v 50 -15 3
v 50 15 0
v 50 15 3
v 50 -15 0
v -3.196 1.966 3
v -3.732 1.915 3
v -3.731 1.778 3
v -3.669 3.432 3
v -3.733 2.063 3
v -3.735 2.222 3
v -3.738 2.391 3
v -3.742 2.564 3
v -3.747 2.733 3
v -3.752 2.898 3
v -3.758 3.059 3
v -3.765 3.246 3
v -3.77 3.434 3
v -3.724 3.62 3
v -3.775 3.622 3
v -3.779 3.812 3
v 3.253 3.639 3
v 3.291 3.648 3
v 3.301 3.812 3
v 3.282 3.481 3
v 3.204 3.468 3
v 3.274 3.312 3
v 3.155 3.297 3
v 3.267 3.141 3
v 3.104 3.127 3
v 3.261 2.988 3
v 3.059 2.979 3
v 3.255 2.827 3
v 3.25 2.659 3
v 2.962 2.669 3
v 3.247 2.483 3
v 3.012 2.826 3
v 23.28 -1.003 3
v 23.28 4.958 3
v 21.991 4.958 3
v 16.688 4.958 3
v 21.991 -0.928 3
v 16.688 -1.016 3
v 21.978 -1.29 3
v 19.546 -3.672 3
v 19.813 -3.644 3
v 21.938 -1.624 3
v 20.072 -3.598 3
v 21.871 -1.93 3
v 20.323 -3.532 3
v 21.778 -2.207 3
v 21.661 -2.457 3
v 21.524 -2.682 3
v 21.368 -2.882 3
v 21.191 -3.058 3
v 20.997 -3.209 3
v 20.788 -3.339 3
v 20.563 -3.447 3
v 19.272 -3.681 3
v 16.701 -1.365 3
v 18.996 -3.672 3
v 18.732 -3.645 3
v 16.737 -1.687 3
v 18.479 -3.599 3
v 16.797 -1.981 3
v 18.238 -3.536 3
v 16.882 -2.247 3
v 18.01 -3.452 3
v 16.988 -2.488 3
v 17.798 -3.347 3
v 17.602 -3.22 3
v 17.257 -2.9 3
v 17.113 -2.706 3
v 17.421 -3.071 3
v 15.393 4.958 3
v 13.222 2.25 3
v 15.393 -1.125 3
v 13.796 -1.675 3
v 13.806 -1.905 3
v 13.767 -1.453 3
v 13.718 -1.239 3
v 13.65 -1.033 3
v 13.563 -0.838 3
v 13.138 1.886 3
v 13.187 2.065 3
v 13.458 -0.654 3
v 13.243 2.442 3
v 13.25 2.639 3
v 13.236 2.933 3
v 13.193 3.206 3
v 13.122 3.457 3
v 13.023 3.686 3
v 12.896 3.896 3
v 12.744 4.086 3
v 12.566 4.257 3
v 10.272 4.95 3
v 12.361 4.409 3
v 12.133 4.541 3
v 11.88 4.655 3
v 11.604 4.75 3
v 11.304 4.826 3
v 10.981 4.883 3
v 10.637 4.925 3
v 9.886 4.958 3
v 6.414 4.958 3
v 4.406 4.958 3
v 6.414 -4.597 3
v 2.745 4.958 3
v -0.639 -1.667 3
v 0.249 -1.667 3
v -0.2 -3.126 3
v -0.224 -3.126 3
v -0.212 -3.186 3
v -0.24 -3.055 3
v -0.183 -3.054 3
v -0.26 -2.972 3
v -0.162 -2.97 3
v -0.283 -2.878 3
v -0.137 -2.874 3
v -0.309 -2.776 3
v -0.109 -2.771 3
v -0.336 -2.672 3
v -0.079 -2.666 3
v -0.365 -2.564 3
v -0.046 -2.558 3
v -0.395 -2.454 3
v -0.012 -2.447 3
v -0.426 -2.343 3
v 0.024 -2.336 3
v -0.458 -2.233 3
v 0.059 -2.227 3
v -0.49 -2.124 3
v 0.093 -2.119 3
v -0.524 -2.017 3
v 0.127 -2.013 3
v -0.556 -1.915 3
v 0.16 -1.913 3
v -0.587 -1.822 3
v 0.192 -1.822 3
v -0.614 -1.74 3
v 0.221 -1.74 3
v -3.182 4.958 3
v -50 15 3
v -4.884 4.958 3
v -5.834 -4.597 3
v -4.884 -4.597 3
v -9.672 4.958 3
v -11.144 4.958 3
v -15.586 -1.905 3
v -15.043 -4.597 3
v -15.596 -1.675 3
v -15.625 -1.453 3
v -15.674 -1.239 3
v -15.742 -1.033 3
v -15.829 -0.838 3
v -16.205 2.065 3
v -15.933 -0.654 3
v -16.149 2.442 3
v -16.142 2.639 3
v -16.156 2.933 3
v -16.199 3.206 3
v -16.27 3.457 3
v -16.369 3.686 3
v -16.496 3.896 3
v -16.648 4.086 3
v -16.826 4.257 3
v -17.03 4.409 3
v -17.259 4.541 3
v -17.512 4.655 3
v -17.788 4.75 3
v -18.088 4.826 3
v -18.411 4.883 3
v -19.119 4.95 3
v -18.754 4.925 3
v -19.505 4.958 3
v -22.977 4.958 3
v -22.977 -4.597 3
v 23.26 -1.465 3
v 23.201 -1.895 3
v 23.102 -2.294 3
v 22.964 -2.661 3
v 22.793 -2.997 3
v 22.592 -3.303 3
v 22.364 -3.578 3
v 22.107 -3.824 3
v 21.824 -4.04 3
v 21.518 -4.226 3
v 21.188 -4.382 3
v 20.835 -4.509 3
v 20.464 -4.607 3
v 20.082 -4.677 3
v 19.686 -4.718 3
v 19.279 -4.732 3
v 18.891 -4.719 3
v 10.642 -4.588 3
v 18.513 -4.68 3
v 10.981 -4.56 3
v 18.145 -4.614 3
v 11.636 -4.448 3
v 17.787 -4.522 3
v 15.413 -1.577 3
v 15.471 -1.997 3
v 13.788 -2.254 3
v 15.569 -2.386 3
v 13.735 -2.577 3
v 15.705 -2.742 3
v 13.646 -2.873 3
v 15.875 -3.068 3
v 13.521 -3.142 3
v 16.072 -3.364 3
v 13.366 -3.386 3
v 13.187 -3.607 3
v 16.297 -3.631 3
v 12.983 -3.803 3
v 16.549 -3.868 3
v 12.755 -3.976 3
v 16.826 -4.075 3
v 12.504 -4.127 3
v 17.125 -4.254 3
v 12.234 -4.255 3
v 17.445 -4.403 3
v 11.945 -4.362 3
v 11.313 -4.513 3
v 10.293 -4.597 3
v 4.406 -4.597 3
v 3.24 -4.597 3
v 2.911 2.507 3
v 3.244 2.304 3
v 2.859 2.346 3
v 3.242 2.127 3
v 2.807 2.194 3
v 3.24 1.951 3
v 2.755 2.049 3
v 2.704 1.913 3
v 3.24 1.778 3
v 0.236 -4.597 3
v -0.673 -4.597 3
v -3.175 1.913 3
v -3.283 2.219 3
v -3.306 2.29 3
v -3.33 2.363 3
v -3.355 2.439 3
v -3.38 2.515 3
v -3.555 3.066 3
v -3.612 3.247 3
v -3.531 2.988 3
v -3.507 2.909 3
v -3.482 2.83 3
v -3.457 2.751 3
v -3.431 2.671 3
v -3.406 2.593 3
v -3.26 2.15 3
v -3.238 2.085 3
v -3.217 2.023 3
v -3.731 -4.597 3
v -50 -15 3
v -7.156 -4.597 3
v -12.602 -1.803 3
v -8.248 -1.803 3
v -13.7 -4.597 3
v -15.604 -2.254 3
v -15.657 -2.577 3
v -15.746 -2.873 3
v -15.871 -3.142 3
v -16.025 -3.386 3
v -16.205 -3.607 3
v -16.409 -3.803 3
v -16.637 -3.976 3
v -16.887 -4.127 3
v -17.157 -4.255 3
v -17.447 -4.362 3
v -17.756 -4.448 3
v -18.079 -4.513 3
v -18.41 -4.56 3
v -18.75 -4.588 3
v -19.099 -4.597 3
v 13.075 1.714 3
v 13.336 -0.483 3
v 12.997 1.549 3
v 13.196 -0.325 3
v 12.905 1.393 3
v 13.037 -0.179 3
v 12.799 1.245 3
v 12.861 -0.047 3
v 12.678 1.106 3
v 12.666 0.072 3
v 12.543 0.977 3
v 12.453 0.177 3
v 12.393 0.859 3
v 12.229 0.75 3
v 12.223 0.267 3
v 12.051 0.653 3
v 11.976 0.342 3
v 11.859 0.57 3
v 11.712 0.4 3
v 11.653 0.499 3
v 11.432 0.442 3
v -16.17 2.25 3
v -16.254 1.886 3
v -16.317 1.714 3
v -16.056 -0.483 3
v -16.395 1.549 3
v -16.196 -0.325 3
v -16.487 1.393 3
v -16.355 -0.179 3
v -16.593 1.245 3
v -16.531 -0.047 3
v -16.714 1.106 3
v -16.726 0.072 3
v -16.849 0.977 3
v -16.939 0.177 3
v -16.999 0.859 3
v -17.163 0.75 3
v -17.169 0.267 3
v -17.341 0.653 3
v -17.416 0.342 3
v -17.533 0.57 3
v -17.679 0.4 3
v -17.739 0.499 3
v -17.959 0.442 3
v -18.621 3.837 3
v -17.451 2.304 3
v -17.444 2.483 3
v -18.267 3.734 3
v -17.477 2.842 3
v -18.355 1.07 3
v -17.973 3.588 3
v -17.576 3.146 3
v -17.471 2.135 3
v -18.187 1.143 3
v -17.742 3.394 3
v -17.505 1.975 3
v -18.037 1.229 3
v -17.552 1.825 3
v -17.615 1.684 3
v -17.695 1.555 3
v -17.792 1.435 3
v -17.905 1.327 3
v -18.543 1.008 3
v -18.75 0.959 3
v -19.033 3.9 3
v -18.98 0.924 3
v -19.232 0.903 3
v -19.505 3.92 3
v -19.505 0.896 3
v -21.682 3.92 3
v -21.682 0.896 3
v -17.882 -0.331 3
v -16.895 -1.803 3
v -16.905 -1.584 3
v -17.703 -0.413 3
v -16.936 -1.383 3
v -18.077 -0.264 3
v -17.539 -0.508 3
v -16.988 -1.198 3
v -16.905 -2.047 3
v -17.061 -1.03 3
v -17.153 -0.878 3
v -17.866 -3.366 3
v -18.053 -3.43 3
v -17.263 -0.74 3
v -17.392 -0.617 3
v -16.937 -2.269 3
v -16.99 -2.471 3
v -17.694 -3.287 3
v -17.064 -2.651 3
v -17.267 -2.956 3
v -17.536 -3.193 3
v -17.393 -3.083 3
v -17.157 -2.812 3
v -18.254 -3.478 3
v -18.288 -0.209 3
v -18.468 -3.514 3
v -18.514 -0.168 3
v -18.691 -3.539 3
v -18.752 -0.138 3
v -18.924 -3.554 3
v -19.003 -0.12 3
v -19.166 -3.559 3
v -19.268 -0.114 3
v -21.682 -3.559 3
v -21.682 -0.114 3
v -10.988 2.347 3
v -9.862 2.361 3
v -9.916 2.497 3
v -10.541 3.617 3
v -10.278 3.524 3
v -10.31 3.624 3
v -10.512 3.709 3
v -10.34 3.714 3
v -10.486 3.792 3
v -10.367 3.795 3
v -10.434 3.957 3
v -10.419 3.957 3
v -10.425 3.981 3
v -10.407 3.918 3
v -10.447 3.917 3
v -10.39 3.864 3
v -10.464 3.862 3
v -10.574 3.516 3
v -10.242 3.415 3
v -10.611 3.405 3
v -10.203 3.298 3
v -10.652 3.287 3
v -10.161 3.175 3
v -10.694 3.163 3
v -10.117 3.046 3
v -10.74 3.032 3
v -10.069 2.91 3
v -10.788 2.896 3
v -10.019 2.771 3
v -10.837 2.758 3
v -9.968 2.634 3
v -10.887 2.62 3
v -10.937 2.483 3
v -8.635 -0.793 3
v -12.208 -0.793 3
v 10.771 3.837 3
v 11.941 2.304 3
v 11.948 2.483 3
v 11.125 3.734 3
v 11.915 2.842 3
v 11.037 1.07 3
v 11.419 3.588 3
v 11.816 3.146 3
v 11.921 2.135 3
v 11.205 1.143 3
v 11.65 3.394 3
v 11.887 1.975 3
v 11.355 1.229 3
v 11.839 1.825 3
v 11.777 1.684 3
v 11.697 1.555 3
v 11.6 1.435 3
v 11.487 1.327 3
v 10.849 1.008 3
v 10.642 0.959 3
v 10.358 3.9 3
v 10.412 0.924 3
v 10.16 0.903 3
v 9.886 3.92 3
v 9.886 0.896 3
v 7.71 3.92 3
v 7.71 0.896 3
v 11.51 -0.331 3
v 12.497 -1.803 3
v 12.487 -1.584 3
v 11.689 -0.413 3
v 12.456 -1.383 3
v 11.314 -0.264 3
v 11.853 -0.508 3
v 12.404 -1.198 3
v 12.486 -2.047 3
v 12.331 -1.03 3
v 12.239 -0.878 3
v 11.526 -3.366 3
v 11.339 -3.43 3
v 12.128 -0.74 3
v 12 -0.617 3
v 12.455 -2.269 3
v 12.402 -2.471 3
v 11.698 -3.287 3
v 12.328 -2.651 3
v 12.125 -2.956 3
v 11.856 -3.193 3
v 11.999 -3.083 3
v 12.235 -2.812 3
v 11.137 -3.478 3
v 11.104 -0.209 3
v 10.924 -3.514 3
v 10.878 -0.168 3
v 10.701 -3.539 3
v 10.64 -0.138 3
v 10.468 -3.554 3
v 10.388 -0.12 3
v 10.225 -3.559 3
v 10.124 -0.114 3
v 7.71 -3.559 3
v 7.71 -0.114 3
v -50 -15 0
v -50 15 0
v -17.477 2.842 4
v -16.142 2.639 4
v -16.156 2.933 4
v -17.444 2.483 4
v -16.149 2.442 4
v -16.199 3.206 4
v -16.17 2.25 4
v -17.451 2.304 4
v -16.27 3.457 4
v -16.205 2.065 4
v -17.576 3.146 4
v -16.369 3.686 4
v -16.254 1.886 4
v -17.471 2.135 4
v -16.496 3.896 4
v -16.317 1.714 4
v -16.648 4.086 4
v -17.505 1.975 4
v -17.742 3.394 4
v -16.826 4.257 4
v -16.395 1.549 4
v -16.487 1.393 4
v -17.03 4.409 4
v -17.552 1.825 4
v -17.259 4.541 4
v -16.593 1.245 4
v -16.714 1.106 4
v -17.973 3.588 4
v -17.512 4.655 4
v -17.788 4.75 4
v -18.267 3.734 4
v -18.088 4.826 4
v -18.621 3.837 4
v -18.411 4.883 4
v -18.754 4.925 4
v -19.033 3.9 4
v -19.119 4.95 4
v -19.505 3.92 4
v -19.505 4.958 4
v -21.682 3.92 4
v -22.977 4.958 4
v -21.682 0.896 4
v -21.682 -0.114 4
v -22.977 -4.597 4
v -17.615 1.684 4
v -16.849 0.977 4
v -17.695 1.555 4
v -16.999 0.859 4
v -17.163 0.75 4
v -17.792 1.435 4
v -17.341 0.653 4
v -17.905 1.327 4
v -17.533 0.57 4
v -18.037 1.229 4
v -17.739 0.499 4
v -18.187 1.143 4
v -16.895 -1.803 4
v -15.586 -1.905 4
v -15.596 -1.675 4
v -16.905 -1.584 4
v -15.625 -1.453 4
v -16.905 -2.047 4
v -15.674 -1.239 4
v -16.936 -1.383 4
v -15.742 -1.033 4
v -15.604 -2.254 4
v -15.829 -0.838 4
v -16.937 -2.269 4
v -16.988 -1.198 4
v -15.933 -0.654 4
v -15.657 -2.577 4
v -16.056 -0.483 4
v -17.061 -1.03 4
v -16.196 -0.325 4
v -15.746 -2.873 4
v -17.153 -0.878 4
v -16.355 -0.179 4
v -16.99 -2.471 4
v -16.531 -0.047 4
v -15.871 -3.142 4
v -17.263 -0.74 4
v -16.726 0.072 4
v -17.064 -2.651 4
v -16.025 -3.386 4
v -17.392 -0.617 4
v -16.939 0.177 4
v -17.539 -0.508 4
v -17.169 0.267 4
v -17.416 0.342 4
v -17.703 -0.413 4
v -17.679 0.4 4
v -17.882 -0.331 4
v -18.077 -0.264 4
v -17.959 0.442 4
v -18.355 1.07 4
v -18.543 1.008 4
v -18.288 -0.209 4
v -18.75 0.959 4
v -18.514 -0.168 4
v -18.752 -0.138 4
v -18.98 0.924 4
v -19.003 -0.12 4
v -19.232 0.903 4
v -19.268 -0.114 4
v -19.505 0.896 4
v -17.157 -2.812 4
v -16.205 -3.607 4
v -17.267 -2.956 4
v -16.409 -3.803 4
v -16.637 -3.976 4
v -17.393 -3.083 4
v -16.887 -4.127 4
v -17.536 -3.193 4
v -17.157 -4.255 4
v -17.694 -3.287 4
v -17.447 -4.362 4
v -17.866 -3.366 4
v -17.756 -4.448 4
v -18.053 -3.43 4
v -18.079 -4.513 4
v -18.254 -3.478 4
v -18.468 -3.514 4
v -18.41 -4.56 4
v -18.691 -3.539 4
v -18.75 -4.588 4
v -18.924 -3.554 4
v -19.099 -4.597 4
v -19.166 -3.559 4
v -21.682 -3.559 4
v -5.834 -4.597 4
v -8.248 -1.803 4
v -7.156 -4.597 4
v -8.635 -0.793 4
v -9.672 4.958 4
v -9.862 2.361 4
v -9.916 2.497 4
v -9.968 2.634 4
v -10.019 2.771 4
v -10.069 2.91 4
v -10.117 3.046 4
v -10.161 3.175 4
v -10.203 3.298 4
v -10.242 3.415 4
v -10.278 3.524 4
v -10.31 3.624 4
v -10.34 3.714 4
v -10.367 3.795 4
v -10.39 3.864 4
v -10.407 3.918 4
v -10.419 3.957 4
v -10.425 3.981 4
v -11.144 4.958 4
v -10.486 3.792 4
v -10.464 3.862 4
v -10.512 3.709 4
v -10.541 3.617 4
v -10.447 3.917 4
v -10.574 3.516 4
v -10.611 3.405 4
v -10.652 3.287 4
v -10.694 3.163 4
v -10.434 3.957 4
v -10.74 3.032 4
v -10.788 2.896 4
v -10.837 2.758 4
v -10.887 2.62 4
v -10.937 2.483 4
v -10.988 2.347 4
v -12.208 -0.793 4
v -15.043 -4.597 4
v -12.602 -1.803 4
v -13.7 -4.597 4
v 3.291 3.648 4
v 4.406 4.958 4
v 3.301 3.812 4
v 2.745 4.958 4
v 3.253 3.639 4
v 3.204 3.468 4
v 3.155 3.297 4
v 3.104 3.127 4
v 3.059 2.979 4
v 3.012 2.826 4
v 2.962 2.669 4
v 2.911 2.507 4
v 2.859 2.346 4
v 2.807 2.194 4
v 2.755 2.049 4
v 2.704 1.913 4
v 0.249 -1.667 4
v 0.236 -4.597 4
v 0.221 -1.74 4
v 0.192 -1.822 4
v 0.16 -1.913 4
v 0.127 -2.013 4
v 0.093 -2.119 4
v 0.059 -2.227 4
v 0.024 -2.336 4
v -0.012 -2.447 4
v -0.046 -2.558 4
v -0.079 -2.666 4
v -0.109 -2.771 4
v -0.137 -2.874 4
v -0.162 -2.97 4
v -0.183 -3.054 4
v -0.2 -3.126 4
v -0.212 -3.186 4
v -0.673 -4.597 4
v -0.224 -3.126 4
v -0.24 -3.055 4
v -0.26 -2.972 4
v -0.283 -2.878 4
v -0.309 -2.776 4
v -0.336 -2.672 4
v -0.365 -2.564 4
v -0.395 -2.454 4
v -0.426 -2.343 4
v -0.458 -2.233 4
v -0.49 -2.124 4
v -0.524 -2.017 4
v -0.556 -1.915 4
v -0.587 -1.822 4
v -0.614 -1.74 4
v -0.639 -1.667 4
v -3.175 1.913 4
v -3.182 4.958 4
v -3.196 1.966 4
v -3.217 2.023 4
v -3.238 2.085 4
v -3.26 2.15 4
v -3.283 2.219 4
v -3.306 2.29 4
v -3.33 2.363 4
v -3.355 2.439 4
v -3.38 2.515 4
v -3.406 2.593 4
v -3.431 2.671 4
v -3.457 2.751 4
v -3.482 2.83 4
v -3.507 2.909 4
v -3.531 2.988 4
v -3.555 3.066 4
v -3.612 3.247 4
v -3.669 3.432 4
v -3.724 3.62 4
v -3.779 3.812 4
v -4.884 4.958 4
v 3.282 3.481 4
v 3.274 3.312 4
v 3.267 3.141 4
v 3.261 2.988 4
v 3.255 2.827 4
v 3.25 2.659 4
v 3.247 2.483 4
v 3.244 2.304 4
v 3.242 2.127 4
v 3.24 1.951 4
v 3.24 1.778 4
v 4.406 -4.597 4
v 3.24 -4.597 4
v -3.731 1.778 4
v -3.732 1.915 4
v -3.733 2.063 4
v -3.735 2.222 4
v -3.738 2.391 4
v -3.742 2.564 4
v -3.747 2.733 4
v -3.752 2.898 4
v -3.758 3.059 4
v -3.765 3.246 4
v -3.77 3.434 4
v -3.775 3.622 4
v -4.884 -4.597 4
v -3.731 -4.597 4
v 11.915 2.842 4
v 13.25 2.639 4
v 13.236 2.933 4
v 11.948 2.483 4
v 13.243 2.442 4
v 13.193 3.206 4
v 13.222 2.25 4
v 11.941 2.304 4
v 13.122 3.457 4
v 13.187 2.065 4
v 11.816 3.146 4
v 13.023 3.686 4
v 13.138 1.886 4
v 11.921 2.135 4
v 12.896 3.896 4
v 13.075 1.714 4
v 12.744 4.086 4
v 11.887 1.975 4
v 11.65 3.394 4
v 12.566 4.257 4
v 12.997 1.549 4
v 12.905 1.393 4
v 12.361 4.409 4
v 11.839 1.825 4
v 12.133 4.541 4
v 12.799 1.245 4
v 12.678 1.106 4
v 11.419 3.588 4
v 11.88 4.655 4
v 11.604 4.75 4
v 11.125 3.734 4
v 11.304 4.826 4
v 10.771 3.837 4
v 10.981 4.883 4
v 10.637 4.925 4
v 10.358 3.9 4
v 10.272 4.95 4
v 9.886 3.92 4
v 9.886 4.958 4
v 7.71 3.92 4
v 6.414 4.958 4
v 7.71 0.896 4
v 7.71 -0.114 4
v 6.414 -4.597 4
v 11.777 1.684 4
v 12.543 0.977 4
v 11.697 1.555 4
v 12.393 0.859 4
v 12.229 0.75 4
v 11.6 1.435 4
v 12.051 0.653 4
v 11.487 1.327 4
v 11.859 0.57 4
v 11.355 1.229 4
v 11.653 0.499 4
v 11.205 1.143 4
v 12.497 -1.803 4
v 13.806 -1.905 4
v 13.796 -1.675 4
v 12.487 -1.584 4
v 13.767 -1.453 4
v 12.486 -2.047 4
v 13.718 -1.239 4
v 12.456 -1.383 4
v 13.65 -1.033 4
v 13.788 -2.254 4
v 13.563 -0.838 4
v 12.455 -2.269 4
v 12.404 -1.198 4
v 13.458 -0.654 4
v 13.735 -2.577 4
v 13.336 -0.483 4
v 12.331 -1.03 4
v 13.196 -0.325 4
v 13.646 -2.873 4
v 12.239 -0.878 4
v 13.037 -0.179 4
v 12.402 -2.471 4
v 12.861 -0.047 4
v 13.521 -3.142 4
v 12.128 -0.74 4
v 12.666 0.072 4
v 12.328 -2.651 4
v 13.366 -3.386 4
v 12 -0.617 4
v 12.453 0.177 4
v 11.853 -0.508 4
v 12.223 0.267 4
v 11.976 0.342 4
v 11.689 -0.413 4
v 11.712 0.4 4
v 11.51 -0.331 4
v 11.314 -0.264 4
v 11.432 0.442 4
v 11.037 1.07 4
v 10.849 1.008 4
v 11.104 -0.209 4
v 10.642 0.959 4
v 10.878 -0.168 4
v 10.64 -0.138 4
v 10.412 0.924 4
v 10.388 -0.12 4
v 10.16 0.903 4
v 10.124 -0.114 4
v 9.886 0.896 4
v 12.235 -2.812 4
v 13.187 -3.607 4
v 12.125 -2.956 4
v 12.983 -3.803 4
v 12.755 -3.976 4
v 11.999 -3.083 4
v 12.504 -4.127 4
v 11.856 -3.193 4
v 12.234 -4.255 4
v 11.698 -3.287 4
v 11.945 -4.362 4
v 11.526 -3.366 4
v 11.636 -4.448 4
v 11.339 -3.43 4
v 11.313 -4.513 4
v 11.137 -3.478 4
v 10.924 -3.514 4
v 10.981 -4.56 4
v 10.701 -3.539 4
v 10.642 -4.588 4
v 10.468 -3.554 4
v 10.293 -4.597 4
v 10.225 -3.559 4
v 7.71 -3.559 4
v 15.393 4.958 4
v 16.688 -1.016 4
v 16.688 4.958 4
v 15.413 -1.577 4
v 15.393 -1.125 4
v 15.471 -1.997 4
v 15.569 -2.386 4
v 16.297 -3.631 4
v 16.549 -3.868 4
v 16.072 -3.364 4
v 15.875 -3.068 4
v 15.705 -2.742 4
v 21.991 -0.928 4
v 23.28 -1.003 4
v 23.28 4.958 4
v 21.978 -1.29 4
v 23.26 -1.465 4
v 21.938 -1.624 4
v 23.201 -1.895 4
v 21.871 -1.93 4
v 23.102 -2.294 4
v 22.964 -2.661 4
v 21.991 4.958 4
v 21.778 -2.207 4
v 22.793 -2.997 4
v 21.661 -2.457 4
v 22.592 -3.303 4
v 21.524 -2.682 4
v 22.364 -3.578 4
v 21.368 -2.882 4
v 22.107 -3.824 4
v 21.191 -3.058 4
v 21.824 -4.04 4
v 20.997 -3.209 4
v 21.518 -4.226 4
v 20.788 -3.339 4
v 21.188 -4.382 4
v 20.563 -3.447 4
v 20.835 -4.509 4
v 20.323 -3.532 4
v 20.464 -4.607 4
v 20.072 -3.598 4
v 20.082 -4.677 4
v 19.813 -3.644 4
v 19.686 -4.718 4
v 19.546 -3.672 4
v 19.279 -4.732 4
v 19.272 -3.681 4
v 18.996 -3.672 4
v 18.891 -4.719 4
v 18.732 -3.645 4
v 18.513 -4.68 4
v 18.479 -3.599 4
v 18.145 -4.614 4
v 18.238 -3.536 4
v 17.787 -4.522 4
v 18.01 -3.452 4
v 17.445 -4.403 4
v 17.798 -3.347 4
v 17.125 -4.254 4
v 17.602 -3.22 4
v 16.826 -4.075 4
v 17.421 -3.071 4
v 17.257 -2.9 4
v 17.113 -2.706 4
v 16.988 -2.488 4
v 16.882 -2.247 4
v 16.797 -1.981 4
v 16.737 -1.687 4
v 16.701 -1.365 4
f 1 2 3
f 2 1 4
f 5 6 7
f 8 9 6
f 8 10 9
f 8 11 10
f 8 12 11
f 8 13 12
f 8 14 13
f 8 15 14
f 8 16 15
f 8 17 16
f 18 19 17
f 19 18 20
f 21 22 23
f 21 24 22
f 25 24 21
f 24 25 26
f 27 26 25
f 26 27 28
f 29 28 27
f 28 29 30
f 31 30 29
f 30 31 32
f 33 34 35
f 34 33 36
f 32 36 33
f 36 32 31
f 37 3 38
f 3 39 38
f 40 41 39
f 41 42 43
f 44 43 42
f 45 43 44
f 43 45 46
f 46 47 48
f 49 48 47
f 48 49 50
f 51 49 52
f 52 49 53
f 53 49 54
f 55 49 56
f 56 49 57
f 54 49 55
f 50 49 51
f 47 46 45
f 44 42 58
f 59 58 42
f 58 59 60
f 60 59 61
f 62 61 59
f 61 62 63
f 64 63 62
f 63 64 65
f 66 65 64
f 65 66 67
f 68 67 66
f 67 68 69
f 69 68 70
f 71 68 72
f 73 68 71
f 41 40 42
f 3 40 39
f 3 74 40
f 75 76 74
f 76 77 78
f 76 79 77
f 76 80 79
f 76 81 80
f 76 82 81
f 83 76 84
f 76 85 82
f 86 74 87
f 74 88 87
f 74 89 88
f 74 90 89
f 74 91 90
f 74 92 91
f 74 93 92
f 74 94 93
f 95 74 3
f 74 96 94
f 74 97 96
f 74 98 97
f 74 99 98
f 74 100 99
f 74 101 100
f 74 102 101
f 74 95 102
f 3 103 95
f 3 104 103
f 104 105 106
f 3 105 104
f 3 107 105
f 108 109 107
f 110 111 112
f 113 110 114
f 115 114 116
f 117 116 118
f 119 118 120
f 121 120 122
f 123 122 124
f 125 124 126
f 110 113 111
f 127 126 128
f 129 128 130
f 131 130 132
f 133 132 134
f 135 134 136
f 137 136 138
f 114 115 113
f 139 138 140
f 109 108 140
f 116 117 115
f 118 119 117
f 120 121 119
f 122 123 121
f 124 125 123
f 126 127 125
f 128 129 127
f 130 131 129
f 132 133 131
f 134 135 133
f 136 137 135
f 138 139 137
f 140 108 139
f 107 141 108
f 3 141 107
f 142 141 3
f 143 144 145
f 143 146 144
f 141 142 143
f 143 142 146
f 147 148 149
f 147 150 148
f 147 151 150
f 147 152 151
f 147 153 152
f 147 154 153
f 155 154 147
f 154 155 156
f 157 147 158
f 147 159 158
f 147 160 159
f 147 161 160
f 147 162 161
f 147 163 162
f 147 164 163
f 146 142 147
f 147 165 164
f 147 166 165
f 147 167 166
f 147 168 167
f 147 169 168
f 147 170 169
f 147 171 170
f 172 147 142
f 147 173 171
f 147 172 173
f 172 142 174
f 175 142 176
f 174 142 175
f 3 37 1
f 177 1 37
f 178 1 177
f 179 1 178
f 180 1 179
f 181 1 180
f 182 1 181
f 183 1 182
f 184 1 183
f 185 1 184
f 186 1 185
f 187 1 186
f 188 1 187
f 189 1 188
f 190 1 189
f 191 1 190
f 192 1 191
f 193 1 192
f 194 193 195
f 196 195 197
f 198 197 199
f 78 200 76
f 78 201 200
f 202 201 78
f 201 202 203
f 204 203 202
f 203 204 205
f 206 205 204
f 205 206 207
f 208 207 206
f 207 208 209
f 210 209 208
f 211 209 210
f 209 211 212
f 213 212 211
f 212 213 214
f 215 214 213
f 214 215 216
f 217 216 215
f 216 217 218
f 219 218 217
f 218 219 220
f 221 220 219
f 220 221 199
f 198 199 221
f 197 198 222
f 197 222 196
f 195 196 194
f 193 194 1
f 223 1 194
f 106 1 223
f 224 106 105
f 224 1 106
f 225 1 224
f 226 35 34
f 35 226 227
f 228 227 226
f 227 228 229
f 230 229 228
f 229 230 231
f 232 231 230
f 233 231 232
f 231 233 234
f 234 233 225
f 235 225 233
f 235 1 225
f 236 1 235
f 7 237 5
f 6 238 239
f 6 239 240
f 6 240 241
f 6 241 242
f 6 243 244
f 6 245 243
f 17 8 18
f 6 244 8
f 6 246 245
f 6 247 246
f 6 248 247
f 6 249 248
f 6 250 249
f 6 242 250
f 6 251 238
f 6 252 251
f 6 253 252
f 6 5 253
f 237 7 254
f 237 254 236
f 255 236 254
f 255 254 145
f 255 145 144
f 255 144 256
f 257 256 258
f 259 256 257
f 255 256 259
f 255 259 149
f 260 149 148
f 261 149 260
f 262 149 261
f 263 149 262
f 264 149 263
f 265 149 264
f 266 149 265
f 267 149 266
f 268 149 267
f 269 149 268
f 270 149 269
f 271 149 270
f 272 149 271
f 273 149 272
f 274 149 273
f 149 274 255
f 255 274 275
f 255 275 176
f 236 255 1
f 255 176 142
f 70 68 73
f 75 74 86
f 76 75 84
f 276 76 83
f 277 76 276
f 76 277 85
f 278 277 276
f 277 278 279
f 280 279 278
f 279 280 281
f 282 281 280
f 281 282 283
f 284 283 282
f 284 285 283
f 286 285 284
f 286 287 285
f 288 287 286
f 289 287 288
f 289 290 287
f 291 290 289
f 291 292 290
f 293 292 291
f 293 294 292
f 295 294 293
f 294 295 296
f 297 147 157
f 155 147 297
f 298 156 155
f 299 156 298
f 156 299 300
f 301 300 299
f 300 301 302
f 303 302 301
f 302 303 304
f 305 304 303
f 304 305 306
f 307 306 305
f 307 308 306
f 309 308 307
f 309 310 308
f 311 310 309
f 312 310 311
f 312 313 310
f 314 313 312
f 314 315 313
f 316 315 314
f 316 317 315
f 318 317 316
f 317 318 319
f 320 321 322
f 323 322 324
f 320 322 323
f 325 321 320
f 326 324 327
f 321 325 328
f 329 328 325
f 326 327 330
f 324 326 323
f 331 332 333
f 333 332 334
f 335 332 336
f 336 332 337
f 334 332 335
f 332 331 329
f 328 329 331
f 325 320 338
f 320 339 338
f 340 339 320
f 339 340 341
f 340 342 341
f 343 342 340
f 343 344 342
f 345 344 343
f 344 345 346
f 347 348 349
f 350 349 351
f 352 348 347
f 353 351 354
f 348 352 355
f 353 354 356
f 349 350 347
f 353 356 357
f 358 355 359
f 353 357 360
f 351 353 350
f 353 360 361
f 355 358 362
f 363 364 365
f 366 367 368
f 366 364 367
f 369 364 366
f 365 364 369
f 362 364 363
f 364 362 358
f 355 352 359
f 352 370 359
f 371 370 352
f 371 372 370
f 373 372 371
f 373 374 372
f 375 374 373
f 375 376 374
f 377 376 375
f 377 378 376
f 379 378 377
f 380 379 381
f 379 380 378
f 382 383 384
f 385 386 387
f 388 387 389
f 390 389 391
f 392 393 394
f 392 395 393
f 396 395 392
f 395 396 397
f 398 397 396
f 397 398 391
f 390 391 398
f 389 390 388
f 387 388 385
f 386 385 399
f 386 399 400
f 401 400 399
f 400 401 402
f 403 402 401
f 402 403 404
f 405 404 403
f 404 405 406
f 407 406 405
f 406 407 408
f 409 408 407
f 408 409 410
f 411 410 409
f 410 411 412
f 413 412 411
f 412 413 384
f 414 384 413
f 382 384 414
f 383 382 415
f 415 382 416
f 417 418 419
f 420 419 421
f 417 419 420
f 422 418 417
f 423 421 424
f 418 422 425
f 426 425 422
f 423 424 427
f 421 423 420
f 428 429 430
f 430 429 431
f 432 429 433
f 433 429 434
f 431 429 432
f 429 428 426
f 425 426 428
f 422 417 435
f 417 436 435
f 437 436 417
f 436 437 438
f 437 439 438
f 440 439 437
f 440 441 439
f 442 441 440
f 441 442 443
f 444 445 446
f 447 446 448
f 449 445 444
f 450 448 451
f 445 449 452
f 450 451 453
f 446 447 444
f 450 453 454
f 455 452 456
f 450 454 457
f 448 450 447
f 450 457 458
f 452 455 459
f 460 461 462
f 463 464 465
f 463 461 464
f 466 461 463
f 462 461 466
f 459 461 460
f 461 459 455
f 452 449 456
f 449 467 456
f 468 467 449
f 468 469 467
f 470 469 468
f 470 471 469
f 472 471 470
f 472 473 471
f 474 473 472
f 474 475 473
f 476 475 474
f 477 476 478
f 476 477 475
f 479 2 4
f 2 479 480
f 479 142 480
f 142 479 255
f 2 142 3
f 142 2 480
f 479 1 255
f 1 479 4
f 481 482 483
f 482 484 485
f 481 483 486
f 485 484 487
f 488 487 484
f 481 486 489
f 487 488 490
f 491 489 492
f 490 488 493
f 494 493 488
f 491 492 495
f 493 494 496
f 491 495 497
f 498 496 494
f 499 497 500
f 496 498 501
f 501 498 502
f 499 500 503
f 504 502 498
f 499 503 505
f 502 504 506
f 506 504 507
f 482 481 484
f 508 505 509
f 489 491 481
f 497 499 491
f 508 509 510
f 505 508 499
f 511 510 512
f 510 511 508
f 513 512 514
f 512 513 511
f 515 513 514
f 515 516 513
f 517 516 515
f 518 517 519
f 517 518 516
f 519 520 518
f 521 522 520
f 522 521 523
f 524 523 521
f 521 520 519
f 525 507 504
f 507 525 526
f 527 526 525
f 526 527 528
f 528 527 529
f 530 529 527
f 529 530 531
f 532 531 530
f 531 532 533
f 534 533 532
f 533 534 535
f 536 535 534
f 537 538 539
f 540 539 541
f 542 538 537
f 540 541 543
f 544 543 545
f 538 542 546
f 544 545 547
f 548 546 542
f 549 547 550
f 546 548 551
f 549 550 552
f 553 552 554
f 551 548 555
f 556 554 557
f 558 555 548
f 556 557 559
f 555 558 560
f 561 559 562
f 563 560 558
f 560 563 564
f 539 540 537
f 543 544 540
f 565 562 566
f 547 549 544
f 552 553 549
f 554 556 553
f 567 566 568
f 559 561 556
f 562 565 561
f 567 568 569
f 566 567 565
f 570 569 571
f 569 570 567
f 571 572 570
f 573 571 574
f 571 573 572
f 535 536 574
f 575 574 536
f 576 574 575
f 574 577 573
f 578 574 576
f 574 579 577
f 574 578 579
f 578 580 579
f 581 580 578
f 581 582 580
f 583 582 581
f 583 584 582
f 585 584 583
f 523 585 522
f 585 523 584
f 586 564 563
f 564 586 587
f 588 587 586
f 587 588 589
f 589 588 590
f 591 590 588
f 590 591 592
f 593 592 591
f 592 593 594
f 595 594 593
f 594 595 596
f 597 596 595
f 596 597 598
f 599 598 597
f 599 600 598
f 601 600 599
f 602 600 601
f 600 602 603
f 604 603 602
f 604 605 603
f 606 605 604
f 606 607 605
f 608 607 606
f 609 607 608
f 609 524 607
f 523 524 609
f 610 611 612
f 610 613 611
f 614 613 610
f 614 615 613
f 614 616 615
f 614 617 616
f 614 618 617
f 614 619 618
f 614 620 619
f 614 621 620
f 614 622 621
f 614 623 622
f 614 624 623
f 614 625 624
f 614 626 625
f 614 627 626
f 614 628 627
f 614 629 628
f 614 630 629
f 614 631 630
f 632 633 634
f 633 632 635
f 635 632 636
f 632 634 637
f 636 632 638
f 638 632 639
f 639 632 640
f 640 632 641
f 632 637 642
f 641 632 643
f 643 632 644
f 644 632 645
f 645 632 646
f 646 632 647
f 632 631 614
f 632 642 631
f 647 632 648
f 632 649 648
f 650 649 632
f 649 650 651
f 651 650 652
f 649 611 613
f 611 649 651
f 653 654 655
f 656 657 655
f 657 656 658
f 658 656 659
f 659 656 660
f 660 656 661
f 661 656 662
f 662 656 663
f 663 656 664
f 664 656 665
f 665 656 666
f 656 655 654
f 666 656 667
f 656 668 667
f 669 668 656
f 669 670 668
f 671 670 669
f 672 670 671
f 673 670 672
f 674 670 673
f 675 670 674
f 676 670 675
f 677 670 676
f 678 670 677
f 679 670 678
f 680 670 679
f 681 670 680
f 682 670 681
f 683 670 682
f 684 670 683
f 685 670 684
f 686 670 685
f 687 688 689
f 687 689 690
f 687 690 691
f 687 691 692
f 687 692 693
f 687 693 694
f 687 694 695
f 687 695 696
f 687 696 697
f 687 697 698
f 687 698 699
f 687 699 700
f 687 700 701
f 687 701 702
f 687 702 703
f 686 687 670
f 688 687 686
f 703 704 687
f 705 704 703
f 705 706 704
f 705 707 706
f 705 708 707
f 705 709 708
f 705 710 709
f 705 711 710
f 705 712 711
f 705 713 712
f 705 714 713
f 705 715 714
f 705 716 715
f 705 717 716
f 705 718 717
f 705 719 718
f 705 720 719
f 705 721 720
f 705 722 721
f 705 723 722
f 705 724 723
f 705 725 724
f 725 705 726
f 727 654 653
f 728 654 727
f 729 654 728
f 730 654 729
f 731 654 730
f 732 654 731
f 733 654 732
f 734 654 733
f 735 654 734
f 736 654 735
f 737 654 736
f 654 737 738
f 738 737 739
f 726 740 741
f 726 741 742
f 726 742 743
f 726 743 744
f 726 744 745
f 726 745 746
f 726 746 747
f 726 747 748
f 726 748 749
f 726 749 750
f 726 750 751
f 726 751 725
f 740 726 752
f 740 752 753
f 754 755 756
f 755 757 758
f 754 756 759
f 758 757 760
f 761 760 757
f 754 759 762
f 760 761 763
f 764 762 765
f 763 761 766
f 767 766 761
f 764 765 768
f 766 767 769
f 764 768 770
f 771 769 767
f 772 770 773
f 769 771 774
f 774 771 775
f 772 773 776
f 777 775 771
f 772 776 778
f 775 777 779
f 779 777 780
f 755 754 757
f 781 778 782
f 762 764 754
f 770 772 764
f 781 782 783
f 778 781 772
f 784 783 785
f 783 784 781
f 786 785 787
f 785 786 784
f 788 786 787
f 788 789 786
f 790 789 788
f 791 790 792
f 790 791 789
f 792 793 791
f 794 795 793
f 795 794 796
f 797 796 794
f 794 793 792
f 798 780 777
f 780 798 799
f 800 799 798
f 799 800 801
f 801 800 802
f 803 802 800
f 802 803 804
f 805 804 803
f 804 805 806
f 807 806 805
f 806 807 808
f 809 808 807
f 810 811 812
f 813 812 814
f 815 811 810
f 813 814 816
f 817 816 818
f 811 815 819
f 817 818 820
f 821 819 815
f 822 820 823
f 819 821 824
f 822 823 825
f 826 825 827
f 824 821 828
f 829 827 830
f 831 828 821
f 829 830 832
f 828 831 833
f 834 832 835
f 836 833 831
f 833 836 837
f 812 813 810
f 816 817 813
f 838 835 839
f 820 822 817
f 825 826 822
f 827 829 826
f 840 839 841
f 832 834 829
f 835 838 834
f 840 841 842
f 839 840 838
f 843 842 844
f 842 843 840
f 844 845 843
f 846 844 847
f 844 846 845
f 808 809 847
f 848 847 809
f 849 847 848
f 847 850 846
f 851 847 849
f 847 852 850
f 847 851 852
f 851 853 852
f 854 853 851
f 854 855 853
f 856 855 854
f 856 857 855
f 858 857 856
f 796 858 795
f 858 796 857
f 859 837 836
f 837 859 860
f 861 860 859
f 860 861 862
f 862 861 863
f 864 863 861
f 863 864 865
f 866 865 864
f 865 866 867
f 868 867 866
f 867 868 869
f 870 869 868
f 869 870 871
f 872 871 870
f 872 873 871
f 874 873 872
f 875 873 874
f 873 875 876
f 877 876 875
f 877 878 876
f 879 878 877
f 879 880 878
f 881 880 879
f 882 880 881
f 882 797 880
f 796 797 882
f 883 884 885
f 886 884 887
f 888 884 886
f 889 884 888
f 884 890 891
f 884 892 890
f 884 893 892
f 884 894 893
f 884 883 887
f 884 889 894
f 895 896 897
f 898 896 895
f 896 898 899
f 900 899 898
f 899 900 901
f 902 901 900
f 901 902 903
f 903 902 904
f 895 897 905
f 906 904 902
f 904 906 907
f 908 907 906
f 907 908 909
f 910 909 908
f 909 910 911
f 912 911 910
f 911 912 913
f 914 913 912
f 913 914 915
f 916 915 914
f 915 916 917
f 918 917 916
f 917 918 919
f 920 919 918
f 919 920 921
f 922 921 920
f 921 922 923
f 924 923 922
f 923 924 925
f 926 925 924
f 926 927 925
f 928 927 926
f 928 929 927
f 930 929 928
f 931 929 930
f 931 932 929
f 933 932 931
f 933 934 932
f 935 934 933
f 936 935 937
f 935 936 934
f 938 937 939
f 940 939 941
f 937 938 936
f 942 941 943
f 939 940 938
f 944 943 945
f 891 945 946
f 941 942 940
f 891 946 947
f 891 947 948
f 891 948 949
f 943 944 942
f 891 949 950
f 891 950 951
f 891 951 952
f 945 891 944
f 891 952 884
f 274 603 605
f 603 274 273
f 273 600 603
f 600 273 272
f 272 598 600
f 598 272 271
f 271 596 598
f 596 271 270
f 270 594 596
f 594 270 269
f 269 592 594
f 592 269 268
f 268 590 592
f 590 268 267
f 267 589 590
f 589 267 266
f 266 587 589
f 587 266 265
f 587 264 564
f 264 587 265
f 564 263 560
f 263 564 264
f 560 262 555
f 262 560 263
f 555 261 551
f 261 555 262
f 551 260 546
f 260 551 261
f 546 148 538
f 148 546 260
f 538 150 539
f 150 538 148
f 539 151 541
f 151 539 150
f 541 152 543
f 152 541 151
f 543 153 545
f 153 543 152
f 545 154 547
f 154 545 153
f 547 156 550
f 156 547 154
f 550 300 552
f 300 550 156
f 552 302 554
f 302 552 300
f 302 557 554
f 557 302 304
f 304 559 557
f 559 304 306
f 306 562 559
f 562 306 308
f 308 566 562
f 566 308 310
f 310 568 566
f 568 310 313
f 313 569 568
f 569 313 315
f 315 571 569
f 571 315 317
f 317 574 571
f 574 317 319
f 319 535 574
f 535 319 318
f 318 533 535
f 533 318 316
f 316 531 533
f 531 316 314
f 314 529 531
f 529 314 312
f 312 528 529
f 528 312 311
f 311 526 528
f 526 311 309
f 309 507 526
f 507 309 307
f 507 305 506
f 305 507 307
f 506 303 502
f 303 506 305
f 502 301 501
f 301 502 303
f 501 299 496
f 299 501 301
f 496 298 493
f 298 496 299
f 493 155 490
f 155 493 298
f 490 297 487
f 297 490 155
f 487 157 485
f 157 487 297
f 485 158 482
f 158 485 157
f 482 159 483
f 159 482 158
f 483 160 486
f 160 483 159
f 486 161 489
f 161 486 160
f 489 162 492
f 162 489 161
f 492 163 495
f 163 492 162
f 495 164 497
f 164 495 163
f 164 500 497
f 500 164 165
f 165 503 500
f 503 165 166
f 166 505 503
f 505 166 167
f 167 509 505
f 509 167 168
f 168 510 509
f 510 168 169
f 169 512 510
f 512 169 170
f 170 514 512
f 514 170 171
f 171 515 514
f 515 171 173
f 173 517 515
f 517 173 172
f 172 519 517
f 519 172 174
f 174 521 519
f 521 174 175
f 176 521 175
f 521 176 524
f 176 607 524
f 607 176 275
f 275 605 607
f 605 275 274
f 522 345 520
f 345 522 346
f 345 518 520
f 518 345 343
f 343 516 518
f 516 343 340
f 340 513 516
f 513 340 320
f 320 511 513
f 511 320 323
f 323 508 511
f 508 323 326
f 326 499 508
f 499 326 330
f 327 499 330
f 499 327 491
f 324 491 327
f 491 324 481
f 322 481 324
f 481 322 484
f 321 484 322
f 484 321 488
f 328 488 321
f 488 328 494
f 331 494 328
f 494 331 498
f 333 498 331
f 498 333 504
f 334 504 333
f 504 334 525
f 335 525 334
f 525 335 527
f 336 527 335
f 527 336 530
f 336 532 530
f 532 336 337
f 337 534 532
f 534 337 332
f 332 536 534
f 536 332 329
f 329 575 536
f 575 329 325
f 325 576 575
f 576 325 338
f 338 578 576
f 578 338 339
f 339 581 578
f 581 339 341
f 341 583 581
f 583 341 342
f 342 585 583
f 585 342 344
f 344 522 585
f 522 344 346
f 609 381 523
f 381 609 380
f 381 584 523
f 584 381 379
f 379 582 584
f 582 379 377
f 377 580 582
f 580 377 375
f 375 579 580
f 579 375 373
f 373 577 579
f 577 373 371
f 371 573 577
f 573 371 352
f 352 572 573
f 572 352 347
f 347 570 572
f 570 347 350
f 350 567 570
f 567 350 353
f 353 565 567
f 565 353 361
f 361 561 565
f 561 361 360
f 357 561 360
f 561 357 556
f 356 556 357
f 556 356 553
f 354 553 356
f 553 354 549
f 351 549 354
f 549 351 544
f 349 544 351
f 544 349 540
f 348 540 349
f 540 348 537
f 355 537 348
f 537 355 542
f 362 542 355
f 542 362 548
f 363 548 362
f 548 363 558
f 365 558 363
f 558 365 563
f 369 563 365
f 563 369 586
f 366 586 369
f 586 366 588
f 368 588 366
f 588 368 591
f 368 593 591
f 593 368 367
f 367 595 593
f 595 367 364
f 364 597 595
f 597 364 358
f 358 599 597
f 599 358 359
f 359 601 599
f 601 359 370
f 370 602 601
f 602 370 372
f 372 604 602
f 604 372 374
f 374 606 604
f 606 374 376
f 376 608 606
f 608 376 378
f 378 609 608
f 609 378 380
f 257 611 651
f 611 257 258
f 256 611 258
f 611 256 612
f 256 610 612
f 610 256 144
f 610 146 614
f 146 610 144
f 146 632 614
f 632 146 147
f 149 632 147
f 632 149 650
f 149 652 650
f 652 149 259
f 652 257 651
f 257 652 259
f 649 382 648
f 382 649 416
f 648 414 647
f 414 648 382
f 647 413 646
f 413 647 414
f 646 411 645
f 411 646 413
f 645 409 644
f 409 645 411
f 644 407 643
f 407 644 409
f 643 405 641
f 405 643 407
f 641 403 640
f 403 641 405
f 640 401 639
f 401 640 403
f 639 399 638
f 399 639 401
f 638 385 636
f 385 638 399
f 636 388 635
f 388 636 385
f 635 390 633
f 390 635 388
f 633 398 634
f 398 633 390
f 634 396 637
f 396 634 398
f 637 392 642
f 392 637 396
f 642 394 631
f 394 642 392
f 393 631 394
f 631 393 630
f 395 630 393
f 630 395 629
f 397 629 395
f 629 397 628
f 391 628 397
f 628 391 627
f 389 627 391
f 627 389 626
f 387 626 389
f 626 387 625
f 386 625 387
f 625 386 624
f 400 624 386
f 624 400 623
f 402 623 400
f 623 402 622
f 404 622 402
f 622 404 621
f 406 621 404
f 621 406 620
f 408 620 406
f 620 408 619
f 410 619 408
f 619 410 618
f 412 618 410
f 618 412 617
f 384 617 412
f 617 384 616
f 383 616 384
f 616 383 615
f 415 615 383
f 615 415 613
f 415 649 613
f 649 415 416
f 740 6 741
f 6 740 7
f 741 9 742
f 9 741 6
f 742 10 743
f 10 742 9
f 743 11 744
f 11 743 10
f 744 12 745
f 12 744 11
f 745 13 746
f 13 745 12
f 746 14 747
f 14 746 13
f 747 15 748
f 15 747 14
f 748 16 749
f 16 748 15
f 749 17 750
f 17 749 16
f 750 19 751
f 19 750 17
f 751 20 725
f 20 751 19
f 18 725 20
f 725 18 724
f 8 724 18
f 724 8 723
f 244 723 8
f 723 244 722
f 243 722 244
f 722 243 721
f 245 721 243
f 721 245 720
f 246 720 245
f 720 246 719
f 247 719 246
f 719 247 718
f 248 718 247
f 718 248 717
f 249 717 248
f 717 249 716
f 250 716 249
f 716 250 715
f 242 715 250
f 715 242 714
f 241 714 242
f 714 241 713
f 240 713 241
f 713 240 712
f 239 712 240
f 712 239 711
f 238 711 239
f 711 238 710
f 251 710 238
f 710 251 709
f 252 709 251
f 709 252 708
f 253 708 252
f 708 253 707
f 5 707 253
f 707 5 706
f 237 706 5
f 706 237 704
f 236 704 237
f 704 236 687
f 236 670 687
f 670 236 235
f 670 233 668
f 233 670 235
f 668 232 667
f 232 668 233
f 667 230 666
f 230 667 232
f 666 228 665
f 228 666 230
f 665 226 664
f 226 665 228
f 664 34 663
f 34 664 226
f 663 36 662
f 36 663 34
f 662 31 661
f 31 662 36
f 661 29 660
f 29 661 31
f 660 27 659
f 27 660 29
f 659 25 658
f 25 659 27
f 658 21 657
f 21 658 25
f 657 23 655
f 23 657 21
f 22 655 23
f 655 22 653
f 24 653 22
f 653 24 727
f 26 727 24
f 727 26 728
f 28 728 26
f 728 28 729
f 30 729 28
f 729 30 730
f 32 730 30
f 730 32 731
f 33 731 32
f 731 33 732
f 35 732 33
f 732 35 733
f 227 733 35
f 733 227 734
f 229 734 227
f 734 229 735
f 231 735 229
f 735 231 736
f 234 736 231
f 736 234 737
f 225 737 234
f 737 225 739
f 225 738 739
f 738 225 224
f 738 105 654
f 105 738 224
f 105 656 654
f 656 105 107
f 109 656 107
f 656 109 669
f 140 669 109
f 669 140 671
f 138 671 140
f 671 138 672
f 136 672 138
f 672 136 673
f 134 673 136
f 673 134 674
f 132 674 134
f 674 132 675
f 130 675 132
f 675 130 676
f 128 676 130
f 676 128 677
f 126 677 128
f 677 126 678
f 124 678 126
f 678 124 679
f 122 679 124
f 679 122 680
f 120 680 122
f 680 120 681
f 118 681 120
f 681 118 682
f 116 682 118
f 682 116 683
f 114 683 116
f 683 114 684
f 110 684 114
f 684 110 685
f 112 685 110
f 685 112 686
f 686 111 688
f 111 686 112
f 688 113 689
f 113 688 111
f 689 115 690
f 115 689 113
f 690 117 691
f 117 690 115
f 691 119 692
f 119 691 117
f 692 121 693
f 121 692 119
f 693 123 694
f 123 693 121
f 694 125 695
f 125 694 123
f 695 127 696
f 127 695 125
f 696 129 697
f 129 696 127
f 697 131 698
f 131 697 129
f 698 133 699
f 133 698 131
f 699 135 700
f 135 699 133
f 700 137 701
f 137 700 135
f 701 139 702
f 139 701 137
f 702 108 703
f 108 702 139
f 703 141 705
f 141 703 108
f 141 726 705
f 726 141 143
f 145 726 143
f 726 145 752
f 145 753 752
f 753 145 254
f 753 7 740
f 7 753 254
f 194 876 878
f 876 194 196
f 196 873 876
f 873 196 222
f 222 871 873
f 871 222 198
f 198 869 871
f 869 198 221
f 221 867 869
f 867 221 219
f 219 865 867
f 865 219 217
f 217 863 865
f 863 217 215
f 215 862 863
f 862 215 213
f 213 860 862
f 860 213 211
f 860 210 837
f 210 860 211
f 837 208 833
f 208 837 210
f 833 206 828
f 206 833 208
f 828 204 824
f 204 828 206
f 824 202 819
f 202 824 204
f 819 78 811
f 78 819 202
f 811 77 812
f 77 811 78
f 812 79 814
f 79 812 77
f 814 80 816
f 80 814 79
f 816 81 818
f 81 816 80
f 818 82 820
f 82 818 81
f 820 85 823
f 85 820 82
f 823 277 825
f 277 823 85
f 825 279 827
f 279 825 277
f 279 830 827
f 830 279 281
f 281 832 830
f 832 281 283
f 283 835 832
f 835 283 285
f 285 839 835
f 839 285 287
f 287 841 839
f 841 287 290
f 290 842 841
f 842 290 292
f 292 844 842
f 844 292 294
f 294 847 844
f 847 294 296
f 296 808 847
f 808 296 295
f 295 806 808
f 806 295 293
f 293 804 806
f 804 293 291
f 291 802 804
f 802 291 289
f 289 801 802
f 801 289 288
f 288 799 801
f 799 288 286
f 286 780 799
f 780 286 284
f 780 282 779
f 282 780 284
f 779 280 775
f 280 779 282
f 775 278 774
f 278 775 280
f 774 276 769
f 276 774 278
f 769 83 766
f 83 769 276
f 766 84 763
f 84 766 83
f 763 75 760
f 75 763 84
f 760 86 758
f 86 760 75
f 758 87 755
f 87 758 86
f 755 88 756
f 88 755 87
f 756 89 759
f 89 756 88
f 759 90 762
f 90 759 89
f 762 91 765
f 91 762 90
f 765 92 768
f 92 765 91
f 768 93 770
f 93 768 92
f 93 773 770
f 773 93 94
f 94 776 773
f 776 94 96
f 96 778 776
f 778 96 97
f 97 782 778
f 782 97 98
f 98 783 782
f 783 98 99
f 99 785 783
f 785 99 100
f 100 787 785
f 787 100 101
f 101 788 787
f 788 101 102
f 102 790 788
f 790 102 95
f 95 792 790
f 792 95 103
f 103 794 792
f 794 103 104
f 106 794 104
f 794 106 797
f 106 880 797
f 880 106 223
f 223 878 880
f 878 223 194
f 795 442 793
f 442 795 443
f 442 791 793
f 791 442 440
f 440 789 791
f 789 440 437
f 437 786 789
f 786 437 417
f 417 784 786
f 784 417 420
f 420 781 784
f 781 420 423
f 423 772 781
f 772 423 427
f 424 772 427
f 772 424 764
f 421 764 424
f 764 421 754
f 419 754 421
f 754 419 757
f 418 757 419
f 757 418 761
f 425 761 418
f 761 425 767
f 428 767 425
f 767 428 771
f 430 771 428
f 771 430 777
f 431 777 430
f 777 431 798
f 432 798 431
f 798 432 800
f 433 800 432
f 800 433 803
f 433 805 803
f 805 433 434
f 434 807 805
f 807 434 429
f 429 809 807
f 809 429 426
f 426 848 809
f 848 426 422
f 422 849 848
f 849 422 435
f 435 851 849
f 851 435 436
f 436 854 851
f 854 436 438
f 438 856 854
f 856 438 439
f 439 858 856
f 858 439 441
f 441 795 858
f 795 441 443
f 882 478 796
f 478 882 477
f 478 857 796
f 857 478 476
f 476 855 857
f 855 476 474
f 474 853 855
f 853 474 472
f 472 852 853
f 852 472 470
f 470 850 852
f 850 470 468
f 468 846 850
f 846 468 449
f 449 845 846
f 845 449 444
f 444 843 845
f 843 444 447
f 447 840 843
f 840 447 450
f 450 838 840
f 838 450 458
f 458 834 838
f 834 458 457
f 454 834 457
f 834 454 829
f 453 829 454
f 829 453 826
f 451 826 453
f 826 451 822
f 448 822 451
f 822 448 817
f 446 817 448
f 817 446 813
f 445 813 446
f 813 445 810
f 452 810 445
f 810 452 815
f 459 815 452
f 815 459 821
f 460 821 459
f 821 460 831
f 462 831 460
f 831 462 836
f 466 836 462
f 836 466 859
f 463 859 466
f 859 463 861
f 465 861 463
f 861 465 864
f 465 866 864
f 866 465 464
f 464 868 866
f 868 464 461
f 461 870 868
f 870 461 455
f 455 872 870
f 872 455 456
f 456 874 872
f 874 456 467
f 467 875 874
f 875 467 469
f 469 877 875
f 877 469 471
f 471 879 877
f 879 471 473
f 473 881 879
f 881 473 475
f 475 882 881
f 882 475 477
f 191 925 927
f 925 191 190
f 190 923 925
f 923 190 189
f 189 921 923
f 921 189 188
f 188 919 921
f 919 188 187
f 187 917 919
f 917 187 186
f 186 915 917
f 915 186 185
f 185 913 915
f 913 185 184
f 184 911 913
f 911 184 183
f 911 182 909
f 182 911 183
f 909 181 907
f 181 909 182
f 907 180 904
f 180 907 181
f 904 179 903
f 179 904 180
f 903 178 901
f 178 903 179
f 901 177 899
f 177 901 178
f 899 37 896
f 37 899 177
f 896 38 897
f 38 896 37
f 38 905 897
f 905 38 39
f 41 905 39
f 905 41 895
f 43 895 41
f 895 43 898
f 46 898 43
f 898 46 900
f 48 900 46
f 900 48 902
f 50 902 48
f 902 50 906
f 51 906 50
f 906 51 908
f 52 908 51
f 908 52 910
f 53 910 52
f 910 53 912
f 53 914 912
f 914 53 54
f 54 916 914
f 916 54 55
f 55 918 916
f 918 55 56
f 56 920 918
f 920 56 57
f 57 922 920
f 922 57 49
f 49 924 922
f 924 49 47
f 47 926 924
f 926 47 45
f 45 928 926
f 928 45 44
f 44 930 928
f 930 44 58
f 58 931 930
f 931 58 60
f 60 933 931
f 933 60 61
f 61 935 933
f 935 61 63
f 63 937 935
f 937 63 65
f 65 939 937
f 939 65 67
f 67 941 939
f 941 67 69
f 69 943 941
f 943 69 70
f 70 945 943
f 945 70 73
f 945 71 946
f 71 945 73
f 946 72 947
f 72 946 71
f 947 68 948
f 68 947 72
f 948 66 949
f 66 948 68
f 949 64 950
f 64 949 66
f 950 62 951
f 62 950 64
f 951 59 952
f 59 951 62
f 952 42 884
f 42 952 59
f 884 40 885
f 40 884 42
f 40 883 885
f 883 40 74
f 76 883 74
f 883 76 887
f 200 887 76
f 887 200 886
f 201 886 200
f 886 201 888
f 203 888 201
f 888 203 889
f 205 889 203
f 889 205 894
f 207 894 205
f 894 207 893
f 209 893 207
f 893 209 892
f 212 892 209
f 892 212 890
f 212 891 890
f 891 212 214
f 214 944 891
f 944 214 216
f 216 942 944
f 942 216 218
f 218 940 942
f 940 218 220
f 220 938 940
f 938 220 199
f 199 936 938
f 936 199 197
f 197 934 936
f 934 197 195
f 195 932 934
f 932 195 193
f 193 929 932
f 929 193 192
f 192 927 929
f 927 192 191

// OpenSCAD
// Exemplo opcional: requer OpenSCAD externo. Medidas em mm.
nome = "BAMBU";
largura = 100;
profundidade = 30;
espessura = 3;
union() {
    translate([-largura/2, -profundidade/2, 0])
        cube([largura, profundidade, espessura]);
    translate([0, 0, espessura - 0.1])
        linear_extrude(height=1.1)
            text(nome, size=10, halign="center", valign="center", font="Arial");
}
